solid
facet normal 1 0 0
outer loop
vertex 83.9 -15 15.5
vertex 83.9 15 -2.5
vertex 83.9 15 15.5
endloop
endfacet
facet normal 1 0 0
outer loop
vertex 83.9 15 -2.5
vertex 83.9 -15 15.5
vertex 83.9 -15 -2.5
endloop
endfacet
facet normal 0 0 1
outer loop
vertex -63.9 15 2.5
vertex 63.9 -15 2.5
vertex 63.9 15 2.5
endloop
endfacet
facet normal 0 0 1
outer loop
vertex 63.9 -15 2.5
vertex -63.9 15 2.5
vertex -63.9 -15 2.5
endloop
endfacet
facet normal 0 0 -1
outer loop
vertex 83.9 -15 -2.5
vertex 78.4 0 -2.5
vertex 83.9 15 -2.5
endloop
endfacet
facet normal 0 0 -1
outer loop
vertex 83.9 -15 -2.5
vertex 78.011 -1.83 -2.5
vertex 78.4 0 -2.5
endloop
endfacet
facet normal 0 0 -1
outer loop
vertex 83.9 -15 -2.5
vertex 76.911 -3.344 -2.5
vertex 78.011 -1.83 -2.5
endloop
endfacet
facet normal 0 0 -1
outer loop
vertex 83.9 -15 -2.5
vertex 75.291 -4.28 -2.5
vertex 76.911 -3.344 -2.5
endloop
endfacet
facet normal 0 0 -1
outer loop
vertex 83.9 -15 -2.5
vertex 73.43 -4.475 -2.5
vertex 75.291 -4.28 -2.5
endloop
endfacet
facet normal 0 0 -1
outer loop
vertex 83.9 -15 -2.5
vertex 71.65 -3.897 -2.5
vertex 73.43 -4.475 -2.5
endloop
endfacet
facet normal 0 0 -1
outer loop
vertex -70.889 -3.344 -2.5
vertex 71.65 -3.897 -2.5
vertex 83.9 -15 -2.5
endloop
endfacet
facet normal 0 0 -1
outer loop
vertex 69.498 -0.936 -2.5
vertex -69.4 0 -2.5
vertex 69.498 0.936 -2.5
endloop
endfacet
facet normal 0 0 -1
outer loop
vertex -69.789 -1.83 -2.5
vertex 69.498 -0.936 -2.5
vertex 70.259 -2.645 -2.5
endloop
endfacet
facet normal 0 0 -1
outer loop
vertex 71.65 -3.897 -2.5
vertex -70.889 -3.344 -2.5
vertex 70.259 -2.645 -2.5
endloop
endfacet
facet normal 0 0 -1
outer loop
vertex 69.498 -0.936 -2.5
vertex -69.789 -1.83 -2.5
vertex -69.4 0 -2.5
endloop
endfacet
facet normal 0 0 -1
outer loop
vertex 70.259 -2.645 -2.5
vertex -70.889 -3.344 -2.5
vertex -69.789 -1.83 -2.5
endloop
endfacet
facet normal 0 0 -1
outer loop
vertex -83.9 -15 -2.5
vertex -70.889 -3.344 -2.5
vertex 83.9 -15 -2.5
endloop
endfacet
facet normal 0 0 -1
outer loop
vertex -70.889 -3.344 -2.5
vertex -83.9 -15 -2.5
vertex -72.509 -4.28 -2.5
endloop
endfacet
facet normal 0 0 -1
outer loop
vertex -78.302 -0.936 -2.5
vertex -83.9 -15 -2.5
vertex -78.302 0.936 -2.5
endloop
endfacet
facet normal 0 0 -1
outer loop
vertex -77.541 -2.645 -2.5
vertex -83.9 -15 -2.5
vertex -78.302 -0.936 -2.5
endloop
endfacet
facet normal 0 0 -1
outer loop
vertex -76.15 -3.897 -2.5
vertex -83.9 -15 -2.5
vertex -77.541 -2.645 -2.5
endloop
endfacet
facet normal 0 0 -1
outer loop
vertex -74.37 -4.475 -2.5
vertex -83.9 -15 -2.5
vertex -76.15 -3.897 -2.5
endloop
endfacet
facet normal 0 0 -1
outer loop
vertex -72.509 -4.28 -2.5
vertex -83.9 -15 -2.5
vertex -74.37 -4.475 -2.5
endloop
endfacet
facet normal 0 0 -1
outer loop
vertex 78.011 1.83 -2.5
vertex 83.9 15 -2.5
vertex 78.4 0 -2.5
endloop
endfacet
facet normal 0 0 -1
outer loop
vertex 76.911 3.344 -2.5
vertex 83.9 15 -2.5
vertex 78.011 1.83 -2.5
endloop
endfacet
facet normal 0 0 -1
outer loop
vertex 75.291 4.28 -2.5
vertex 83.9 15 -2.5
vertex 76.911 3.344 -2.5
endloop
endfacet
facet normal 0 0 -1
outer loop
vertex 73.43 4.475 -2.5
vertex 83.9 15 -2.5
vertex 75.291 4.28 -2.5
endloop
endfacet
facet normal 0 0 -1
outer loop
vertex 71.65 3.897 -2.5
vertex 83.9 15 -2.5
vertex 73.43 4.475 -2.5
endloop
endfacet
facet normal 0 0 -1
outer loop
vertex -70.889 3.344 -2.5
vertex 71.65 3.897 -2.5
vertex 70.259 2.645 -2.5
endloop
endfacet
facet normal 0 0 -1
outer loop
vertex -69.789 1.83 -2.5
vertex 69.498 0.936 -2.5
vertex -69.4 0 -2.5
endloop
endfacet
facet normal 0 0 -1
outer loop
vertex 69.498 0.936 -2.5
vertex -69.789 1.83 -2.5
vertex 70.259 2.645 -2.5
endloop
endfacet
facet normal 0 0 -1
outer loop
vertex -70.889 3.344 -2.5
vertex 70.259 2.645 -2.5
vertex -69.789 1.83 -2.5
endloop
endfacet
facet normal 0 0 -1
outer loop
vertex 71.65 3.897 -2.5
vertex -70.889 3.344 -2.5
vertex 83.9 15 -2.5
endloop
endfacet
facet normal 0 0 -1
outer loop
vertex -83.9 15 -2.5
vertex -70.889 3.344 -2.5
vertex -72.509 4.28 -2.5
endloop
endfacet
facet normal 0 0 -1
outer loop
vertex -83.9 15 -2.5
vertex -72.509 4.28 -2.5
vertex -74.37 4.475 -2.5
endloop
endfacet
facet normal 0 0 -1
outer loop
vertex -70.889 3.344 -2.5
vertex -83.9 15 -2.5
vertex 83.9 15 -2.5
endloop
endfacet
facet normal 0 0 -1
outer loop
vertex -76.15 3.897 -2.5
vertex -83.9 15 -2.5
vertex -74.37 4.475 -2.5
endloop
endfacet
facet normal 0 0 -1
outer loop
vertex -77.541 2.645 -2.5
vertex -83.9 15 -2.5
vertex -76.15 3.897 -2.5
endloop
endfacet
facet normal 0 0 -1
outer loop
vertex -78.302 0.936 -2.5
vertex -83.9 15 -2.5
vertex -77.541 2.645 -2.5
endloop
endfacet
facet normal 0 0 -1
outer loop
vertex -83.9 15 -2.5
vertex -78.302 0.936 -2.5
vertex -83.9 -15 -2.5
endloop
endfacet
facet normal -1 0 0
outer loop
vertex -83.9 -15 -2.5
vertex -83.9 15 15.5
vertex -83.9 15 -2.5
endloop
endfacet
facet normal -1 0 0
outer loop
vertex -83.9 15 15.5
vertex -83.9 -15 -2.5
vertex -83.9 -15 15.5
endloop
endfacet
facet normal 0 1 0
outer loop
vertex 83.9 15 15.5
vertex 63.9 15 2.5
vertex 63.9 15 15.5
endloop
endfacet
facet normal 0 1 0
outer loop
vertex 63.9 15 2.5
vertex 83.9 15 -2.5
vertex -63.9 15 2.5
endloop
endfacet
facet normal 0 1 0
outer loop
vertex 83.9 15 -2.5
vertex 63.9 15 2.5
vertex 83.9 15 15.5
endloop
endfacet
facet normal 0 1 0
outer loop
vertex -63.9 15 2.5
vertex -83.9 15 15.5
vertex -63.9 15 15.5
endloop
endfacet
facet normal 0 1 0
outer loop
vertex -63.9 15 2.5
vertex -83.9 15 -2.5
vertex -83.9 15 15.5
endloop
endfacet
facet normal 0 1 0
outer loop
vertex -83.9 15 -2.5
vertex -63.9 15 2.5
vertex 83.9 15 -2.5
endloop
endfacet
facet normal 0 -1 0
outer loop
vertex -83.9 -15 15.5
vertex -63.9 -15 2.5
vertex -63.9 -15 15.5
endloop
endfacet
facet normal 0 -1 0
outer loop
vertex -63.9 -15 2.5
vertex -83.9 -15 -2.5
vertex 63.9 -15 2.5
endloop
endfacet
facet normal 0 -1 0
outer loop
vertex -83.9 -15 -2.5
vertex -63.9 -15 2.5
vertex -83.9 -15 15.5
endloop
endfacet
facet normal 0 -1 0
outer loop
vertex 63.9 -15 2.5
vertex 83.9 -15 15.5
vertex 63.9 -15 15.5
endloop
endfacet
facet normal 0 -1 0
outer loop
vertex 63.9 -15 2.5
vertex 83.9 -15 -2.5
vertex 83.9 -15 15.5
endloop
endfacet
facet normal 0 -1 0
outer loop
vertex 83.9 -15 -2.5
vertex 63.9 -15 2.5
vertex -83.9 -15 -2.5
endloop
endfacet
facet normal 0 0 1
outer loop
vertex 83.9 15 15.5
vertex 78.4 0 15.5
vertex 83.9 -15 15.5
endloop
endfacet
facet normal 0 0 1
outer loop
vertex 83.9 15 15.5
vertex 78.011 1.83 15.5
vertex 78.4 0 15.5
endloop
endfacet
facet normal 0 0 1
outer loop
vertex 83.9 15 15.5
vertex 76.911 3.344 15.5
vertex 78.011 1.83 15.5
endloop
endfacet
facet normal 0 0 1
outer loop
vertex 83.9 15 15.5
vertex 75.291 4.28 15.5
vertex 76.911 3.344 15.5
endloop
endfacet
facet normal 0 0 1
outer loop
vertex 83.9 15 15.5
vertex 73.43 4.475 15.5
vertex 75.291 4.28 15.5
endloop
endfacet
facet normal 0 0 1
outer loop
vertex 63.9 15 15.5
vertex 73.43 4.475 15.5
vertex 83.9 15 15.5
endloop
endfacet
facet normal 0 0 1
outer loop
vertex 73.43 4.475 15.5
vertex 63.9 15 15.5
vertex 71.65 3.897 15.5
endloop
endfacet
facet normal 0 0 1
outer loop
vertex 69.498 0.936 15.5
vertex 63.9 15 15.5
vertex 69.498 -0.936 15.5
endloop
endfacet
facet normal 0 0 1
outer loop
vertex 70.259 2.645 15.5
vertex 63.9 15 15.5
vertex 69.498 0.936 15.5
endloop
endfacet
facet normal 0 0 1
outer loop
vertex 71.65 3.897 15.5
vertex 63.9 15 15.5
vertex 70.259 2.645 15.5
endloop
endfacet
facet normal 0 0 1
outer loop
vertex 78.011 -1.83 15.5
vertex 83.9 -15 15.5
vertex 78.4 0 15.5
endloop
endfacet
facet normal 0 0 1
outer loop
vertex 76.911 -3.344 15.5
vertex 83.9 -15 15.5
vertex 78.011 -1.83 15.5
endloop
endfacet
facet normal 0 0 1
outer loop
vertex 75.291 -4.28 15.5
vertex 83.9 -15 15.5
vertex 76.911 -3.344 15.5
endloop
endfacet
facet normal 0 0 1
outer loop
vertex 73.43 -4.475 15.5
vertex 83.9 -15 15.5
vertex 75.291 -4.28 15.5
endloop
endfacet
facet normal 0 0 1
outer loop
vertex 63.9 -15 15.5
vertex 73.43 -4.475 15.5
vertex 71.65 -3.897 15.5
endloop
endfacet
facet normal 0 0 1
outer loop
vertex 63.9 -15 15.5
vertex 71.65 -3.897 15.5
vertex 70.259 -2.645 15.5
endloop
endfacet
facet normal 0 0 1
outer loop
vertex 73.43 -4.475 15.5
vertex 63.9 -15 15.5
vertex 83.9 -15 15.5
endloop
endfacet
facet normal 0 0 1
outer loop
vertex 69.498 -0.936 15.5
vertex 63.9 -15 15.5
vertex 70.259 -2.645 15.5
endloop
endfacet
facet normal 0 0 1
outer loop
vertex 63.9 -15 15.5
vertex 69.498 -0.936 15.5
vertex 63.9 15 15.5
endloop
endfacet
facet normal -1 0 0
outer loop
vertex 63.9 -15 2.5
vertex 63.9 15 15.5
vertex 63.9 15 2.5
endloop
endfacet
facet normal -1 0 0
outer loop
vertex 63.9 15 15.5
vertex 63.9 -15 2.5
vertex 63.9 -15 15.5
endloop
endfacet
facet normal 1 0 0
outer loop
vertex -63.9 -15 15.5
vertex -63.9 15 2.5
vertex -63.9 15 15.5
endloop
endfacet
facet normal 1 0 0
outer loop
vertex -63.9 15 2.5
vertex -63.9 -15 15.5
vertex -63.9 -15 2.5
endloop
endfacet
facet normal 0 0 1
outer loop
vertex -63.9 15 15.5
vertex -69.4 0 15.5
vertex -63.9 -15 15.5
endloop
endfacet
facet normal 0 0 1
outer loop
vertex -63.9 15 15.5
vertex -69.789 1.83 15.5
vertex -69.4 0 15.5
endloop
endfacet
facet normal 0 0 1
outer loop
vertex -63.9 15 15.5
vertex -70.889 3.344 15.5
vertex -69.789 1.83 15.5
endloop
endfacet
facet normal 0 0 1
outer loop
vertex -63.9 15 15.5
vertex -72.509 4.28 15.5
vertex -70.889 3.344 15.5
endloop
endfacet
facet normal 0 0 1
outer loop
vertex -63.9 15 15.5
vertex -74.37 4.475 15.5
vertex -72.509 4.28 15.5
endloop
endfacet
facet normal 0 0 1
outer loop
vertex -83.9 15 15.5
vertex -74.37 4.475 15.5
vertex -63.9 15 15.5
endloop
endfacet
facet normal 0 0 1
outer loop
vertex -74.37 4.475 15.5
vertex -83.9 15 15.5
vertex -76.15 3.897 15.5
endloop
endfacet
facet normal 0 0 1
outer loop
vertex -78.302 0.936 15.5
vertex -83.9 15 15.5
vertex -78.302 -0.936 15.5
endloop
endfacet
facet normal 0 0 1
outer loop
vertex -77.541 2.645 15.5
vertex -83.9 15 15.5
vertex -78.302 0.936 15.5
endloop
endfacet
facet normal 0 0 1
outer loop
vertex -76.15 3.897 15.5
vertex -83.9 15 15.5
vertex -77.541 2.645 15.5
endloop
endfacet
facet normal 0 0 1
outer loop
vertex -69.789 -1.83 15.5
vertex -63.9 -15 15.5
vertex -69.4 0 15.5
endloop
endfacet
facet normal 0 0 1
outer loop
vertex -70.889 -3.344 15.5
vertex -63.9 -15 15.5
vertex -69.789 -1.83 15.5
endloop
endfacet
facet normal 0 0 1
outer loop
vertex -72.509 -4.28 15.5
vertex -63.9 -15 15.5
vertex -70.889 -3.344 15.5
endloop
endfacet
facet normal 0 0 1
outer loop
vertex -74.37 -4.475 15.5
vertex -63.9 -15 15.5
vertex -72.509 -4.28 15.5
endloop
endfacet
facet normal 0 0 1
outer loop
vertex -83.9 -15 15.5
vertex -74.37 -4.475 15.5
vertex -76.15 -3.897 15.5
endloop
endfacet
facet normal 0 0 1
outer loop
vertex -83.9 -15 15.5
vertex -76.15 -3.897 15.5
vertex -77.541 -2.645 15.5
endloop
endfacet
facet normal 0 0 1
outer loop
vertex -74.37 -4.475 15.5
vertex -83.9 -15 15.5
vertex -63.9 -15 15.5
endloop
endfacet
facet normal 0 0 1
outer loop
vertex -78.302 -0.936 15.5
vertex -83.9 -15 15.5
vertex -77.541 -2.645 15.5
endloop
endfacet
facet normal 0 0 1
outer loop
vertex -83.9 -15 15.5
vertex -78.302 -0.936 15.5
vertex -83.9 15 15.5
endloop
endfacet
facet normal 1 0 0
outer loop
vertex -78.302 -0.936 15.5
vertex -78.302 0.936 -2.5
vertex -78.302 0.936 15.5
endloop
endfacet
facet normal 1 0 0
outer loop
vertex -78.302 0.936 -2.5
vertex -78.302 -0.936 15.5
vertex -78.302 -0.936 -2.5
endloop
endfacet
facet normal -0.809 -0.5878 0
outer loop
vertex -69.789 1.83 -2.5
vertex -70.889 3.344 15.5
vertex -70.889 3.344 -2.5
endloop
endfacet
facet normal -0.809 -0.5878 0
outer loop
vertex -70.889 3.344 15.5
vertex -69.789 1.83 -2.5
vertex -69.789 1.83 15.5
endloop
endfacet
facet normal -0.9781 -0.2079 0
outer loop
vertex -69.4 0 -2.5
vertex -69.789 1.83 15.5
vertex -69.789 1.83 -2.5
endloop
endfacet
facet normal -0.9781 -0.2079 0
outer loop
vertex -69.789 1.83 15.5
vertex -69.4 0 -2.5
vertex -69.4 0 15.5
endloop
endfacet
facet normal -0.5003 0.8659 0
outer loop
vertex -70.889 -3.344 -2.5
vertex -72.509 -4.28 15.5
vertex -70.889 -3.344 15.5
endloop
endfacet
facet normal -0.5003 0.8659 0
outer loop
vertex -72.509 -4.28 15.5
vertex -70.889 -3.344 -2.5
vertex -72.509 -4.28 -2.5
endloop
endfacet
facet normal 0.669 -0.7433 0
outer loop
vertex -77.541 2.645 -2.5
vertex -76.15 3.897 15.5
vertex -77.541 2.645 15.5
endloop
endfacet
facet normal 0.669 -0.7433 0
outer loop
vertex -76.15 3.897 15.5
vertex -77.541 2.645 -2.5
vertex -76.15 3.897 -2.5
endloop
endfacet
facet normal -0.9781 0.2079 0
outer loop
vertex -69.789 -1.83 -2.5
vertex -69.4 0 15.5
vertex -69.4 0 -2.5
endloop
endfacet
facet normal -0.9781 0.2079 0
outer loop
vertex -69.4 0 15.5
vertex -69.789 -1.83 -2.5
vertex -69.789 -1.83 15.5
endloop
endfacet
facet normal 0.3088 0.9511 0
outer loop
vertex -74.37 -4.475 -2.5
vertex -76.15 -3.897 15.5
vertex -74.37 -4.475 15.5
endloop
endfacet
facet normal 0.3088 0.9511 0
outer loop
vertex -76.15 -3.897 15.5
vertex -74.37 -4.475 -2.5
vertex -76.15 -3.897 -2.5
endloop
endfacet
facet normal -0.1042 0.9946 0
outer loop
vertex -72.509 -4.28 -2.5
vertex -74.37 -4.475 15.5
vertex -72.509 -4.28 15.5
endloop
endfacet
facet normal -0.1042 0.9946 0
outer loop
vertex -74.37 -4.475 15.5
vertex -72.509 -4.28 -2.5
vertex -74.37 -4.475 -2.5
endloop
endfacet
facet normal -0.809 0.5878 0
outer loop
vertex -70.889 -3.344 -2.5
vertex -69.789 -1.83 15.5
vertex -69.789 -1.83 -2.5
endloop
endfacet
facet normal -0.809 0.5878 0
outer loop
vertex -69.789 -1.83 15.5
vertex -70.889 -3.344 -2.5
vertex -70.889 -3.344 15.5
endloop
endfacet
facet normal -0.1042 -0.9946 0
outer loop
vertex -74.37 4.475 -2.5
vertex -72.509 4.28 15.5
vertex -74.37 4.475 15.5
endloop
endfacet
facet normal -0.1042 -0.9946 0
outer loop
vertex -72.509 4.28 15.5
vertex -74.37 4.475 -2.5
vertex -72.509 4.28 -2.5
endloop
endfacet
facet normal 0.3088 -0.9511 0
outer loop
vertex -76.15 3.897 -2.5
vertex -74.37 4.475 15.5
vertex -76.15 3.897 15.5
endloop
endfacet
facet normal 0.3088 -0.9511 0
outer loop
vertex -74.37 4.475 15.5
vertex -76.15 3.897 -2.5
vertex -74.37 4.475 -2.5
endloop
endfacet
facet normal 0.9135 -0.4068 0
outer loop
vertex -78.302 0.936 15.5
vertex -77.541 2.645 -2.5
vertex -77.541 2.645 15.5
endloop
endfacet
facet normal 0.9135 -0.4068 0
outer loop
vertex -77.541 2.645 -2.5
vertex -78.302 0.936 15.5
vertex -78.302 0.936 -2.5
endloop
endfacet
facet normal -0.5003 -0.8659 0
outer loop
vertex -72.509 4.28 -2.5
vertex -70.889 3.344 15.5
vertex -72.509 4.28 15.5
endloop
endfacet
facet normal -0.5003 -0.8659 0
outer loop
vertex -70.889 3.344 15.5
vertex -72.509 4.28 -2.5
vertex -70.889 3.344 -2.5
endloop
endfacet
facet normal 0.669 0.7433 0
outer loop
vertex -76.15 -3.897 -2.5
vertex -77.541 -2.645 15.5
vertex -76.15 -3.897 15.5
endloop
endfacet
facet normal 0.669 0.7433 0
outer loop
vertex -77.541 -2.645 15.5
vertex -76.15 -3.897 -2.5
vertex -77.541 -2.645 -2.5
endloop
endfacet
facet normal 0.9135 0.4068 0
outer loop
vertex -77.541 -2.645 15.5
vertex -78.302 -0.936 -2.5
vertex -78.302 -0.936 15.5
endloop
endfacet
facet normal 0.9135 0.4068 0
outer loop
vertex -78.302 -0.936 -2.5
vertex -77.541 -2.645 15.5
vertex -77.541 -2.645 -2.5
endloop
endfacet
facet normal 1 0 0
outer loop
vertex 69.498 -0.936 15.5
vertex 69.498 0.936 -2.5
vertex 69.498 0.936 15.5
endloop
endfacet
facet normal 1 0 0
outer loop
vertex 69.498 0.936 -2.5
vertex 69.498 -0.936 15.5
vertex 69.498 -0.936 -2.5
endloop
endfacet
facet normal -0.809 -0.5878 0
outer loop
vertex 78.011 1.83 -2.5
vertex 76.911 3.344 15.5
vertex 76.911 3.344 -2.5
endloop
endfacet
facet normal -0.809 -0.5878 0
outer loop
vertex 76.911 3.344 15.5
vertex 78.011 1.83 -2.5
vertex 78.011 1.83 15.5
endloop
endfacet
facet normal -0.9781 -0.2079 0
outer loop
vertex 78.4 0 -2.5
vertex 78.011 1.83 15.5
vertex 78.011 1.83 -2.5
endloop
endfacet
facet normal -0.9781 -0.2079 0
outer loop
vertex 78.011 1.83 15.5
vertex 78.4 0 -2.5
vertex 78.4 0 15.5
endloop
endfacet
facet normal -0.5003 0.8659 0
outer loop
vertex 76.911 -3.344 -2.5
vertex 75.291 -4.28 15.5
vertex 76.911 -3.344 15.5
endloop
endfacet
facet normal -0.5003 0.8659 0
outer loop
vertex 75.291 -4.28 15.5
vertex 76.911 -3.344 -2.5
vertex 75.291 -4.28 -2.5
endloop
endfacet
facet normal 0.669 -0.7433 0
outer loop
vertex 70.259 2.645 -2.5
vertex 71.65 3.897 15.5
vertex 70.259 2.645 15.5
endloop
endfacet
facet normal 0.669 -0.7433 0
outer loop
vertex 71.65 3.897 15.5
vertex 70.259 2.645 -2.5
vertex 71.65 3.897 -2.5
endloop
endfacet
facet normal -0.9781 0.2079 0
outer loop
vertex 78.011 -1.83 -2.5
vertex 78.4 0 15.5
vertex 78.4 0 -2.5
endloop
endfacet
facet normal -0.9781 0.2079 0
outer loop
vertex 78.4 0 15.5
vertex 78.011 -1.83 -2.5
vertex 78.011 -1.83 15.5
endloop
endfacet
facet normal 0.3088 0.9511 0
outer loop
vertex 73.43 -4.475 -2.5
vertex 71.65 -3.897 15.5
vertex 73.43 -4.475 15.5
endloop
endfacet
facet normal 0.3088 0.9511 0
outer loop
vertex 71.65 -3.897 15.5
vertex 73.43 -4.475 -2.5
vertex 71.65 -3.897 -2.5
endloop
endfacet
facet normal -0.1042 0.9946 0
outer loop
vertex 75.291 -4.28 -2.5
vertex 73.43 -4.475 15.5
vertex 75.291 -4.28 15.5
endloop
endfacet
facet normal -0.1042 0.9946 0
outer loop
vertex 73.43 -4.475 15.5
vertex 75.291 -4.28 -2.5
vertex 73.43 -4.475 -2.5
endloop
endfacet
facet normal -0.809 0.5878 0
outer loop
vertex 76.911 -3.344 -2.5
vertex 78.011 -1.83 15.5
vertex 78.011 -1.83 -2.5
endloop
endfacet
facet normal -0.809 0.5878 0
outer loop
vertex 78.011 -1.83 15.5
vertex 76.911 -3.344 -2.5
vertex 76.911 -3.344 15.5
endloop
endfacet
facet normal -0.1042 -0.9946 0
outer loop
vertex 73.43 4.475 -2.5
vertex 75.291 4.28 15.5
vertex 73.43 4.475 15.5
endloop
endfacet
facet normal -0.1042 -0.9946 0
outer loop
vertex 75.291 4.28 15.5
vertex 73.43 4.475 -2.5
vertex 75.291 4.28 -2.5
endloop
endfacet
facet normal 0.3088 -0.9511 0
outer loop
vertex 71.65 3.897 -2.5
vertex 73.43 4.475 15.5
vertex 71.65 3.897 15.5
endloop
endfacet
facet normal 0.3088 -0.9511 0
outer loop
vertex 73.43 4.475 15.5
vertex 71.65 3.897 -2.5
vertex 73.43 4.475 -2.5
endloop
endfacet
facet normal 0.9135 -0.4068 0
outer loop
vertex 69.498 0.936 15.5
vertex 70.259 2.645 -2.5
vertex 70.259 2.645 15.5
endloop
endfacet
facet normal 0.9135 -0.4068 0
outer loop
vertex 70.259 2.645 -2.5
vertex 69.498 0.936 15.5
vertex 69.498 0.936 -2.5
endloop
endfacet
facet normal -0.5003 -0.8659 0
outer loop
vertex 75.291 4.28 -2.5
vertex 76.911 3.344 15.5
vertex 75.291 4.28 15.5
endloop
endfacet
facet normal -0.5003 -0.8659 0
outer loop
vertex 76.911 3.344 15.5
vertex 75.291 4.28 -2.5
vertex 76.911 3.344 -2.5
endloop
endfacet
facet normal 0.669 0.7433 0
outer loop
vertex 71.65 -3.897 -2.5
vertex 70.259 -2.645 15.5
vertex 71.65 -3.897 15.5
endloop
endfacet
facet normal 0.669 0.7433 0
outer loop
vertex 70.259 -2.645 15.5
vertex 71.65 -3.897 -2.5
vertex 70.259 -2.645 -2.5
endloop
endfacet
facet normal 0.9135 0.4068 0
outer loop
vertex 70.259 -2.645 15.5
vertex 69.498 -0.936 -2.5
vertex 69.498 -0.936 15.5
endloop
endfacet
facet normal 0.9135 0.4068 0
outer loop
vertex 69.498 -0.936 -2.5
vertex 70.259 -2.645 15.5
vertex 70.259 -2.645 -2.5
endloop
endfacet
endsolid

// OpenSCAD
difference(){
    //-- Pieza sin taladros
    union(){
        //-- Cuerpo
        color("blue")
        cube([167.8,30,5],center=true);
        
        //-- Torre derecha
        color("green")
        translate([167.8/2-20/2,0,13/2+5/2])
            cube([20,30,13],center=true);
        
        //-- Torre izquierda
        color("green")
        translate([-167.8/2+20/2,0,13/2+5/2])
            cube([20,30,13],center=true);
    }
    
    //-- Taladros
    #translate([-167.8/2+10,0,0])
        cylinder(r=9/2,h=50,center=true);
    #translate([+167.8/2-10,0,0])
        cylinder(r=9/2,h=50,center=true);
}
